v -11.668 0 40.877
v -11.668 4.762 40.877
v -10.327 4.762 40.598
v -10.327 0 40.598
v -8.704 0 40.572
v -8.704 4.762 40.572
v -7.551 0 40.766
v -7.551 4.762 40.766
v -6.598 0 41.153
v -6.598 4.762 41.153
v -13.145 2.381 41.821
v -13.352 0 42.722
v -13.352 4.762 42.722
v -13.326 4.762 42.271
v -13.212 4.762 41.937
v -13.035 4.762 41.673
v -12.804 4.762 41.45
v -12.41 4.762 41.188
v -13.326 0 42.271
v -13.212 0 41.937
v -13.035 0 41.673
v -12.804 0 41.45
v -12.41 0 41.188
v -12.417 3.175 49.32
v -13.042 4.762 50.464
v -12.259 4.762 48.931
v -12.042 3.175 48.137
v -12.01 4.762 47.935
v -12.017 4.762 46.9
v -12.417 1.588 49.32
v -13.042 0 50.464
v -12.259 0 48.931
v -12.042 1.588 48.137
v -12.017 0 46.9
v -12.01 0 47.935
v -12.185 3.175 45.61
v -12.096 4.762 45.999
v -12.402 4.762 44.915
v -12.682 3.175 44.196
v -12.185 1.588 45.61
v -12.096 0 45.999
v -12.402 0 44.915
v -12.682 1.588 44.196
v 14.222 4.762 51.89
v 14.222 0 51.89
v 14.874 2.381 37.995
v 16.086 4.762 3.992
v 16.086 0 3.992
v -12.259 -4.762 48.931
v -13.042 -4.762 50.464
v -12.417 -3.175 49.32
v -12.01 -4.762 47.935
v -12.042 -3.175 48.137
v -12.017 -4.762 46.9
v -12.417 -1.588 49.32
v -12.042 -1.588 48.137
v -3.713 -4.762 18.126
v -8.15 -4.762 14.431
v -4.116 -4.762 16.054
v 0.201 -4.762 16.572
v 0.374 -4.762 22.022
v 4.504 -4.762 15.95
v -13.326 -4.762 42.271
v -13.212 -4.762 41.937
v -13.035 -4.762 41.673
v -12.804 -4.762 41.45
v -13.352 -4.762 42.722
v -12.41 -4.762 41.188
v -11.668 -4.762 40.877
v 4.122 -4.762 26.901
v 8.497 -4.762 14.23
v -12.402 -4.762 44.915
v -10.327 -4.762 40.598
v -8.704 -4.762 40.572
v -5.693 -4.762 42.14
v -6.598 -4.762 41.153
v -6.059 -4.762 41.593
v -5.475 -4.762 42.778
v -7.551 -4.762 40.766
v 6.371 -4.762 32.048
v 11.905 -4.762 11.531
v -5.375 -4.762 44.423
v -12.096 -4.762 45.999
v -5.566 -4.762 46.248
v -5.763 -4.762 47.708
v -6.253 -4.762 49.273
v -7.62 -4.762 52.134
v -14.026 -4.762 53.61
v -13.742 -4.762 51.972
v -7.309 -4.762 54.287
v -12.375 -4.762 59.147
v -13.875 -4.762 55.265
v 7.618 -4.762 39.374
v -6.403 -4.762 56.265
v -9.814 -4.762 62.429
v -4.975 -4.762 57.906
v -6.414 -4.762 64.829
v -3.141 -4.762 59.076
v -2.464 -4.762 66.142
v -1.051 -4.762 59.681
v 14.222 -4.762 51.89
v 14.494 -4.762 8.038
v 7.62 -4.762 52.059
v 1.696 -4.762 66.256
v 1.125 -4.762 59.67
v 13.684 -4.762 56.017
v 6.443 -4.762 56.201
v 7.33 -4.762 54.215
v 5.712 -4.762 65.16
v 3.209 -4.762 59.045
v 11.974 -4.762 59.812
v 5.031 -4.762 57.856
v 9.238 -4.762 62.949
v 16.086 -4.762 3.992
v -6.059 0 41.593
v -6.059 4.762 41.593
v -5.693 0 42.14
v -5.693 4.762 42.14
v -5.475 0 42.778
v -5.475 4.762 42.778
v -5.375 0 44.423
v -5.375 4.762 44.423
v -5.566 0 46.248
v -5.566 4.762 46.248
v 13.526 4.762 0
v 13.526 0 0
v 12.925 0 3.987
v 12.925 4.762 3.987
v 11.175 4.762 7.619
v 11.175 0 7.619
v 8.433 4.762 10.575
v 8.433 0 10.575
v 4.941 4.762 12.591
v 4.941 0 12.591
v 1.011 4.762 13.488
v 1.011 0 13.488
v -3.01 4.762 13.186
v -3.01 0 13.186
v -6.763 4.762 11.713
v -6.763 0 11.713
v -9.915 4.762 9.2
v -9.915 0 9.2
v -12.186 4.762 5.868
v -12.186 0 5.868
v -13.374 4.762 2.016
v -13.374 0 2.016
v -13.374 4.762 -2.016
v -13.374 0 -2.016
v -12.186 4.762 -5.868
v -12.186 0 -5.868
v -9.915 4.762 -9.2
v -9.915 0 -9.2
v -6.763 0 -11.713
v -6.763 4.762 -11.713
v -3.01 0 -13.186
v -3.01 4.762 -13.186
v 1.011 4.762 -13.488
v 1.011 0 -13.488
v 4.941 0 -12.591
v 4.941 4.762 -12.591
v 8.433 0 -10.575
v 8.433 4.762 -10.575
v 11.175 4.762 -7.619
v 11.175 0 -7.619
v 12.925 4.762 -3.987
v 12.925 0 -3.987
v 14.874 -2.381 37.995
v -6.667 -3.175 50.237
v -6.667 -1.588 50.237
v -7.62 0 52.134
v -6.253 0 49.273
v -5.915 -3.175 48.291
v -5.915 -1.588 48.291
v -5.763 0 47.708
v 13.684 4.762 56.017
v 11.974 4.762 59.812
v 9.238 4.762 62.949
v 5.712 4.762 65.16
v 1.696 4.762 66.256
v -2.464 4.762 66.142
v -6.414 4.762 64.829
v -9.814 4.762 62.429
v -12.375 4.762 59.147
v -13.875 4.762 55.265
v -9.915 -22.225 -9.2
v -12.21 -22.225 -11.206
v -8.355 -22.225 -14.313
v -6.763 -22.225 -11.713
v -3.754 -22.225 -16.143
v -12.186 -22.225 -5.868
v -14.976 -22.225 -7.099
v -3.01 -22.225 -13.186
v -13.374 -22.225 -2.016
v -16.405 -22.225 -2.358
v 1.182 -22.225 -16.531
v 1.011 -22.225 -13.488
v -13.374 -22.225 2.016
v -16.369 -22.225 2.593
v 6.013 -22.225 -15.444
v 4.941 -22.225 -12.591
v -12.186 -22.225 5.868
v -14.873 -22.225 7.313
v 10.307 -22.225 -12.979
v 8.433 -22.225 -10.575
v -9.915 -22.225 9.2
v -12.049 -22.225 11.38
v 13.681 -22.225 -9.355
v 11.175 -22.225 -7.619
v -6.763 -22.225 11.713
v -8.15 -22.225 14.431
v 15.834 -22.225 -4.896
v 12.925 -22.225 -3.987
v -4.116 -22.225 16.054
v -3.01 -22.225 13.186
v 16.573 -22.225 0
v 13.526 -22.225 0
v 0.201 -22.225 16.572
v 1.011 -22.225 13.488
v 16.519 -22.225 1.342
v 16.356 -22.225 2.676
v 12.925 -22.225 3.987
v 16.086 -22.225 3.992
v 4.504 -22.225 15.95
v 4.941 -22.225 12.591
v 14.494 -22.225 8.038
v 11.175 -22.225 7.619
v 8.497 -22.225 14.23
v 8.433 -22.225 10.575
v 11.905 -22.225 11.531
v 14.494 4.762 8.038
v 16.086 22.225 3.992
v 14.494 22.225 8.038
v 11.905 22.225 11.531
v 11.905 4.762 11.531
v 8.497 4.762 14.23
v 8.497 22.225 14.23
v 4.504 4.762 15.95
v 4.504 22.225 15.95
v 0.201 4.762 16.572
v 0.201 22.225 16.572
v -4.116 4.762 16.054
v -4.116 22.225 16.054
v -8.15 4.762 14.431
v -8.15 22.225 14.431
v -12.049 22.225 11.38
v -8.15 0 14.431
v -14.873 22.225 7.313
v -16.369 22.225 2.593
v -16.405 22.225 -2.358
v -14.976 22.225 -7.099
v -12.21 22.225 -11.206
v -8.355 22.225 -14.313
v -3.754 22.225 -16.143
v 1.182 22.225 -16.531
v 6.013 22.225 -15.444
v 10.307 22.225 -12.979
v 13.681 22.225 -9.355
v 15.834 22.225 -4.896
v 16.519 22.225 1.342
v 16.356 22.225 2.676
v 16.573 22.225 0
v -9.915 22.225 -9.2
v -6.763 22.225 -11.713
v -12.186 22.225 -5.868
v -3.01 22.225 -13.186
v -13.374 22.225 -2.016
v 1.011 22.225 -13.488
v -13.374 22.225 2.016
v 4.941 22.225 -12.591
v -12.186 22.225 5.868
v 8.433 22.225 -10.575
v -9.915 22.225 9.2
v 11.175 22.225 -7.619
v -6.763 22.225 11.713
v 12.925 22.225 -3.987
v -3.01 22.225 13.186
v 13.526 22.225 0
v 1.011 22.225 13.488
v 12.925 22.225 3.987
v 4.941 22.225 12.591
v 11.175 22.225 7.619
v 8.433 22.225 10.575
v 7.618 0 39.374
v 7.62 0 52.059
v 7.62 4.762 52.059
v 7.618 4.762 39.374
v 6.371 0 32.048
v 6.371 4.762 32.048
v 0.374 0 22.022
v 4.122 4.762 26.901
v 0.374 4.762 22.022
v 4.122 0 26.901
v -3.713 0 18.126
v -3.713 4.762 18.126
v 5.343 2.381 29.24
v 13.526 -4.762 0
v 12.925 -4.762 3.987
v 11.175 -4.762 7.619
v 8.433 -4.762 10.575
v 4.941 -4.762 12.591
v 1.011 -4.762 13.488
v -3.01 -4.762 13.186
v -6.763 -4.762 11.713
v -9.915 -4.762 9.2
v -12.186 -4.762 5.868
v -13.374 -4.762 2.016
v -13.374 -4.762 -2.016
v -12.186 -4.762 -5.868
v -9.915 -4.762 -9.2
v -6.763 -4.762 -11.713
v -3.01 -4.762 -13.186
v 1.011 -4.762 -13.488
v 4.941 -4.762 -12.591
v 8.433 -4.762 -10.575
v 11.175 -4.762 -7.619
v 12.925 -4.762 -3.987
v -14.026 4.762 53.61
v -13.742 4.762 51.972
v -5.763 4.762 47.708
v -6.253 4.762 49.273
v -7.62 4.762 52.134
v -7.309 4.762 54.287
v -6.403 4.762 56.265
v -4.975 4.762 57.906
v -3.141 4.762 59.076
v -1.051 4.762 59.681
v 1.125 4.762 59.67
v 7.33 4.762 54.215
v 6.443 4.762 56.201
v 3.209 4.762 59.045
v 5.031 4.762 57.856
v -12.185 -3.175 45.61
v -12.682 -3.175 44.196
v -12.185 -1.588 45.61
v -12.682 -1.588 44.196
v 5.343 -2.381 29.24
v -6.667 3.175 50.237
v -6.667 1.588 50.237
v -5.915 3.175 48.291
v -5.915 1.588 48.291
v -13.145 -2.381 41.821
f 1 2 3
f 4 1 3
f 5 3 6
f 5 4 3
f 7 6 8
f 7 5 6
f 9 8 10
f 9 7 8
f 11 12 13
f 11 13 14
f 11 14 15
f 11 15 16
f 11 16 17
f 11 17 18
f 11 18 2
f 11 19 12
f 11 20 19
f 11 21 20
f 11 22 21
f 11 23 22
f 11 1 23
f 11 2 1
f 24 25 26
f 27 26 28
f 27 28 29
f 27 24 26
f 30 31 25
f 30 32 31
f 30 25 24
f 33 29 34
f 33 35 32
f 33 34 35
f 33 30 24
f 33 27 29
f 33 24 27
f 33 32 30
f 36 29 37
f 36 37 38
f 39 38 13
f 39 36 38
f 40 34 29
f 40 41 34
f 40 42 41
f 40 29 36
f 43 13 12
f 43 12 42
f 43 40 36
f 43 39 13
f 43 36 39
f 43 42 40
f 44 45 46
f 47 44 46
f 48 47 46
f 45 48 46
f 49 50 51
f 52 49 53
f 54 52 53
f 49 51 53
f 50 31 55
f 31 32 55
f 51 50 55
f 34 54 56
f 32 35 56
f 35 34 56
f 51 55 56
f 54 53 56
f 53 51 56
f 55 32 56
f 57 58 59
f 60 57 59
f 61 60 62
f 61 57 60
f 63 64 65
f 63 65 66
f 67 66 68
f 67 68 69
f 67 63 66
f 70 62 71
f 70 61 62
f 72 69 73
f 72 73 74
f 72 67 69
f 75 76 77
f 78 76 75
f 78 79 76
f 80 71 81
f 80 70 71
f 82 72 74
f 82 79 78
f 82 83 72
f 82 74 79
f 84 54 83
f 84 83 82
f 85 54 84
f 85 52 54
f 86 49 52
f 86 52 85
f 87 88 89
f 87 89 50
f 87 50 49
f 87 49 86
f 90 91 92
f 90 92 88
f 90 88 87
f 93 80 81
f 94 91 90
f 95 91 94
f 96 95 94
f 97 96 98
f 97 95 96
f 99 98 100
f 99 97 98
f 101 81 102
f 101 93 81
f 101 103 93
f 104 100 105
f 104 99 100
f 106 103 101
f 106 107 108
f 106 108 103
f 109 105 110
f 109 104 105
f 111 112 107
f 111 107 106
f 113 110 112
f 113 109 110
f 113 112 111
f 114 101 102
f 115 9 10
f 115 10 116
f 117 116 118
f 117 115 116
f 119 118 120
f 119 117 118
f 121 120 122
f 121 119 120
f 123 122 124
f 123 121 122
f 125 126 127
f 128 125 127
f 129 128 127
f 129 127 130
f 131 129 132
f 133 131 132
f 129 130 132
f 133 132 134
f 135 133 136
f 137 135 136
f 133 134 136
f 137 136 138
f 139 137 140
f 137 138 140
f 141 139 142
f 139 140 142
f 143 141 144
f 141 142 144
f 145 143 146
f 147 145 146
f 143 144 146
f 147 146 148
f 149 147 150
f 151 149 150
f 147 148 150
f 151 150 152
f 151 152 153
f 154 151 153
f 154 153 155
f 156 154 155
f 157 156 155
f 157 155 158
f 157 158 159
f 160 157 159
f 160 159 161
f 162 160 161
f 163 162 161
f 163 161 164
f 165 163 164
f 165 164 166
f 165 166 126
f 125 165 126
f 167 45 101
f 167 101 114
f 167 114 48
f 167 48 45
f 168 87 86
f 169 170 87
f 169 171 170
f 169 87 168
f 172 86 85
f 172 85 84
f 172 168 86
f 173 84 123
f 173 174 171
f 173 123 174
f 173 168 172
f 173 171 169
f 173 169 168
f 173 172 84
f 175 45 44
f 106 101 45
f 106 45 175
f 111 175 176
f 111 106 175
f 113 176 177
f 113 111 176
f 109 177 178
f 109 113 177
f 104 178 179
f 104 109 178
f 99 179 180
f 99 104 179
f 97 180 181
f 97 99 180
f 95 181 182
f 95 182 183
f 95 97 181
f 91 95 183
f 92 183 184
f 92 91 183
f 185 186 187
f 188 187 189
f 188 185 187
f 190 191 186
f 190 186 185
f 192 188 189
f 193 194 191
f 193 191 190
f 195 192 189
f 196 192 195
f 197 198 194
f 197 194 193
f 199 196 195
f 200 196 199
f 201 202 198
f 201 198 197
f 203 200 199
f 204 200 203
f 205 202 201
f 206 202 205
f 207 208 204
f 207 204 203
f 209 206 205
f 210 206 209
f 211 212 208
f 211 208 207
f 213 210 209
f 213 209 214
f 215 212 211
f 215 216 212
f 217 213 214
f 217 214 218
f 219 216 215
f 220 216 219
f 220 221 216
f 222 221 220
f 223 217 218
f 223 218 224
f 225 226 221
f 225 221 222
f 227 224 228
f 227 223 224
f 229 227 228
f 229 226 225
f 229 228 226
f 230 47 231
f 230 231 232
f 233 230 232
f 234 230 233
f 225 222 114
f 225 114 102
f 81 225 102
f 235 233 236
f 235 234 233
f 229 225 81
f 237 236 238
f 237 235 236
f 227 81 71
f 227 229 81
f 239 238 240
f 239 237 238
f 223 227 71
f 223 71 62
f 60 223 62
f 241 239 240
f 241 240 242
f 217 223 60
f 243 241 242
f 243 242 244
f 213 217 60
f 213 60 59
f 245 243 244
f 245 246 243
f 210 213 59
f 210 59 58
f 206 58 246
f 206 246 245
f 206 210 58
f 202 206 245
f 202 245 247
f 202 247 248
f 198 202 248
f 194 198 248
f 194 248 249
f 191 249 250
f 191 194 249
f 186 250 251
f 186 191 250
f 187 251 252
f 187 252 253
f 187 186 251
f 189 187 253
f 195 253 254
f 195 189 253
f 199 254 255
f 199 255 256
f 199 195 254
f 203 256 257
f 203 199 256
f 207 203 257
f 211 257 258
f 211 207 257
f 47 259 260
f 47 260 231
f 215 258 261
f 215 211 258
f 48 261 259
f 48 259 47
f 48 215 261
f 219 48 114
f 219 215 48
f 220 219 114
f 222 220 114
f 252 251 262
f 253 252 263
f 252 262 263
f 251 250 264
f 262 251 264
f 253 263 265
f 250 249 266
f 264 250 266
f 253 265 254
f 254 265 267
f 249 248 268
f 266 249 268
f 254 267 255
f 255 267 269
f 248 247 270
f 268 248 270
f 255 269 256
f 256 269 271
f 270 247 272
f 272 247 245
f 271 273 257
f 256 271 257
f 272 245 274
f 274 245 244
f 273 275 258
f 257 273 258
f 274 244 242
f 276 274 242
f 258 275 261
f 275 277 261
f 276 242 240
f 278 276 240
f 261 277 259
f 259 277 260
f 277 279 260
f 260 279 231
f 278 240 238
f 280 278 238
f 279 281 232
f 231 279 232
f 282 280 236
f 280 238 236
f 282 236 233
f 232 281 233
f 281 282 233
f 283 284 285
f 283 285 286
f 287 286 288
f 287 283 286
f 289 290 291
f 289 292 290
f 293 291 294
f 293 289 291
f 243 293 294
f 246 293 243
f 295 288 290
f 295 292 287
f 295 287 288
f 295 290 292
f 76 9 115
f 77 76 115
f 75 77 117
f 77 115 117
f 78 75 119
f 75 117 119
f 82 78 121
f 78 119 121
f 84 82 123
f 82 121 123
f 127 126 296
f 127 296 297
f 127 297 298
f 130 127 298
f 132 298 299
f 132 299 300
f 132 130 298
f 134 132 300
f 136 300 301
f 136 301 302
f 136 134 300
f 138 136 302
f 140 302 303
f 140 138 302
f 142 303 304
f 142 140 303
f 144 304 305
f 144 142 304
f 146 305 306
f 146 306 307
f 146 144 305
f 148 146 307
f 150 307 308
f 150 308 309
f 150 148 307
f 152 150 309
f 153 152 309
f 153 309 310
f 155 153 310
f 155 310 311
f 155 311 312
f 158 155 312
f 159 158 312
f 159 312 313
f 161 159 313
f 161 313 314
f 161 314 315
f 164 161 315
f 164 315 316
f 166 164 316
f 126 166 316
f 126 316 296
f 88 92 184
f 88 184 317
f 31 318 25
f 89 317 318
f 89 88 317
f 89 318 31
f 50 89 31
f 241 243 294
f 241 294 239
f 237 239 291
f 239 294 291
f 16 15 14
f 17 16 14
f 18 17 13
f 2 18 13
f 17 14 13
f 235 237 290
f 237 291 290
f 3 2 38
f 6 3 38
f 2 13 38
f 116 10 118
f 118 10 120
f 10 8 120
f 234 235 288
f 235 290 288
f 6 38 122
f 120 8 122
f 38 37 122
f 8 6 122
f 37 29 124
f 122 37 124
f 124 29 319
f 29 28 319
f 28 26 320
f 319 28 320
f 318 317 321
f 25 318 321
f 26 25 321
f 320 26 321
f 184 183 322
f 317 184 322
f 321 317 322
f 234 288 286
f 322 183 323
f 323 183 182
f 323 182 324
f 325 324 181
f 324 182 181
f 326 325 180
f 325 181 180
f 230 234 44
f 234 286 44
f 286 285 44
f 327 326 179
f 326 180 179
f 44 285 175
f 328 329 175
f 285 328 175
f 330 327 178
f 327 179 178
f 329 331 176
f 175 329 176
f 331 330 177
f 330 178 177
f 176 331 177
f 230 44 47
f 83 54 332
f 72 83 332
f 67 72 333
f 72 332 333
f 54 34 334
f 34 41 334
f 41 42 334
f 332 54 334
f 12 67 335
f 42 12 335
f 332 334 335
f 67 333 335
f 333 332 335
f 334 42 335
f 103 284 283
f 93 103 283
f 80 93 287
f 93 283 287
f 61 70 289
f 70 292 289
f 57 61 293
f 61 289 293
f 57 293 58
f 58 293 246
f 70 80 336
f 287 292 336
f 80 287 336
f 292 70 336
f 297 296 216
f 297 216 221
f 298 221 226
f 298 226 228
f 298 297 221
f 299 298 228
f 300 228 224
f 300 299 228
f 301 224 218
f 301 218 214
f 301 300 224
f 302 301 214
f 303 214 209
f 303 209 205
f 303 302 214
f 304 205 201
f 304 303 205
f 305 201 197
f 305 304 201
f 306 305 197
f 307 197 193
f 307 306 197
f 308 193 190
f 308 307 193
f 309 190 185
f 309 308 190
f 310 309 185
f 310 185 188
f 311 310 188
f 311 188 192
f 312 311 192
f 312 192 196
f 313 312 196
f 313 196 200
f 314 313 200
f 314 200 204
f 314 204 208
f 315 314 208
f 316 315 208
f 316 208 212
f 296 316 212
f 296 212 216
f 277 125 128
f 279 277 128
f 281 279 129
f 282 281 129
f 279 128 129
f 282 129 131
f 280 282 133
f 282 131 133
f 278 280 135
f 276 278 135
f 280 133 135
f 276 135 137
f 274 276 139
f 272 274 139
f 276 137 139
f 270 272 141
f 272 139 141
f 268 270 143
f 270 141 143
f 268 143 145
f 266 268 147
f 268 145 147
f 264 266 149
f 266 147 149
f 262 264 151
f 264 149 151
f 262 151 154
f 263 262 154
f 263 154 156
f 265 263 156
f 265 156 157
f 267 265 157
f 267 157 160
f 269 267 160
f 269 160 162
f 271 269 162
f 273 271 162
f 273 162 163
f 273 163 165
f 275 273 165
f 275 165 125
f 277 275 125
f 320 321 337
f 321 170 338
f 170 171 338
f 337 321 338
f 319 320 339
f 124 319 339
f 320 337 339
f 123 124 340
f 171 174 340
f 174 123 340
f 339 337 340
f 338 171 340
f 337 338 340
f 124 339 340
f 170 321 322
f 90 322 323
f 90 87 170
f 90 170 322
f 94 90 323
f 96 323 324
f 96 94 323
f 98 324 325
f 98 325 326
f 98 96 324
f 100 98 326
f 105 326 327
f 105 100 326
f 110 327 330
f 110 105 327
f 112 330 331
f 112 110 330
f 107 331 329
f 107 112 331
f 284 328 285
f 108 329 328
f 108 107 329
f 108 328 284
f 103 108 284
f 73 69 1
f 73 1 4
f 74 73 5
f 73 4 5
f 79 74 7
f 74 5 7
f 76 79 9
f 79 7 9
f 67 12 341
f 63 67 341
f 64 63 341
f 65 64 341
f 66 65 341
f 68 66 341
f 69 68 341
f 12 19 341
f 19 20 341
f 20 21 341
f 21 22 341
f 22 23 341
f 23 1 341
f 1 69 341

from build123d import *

# Parameters (mm, degrees)
F0_R     = 13.5255
F1_DEPTH = 22.225
F2_DEPTH = 4.7625


with BuildPart() as f1:
    # F0 (on Front) → F1 (new body, symmetric)
    with BuildSketch(Plane.XZ):
        with BuildLine():
            ThreePointArc((16.0855769131, 3.991881464), (6.5567714231, 15.2213550893), (-8.1495274532, 14.4314276681))
            ThreePointArc((-8.1495274532, 14.4314276681), (-8.3550795629, -14.3134044779), (16.5735, 0))
            ThreePointArc((16.5735, 0), (16.4510670052, 2.0107950269), (16.0855769131, 3.991881464))
        make_face()
        Circle(F0_R, mode=Mode.SUBTRACT)
    extrude(amount=F1_DEPTH, both=True)

    # F0 (on Front) → F2 (join, symmetric)
    with BuildSketch(Plane.XZ):
        with BuildLine():
            ThreePointArc((16.0855769131, 3.991881464), (6.5567714231, 15.2213550893), (-8.1495274532, 14.4314276681))
            ThreePointArc((-8.1495274532, 14.4314276681), (-8.3550795629, -14.3134044779), (16.5735, 0))
            ThreePointArc((16.5735, 0), (16.4510670052, 2.0107950269), (16.0855769131, 3.991881464))
        make_face()
        Circle(F0_R, mode=Mode.SUBTRACT)
        with BuildLine():
            add(Edge.make_bspline(
                [(7.6196315943, 52.0585709196), (7.9073561804, 43.8512833929), (8.4668828165, 27.9749976478), (-2.735262235, 18.8402392219), (-8.1495274532, 14.4314276681)],
                knots=[0, 0, 0, 0, 0.5168803488, 1, 1, 1, 1], degree=3))
            ThreePointArc((-8.1495274532, 14.4314276681), (6.5567714231, 15.2213550893), (16.0855769131, 3.991881464))
            add(Edge.make_bspline(
                [(14.2219077444, 51.8895407599), (14.4256822763, 47.7682077132), (14.9759634895, 37.2014626867), (15.653478831, 16.5725180559), (16.0855769131, 3.991881464)],
                knots=[0, 0, 0, 0, 0.3900119934, 1, 1, 1, 1], degree=3))
            ThreePointArc((14.2219077444, 51.8895407599), (1.6964946006, 66.2559672798), (-13.8750644733, 55.2647556367))
            ThreePointArc((-13.8750644733, 55.2647556367), (-13.937377269, 52.7814096229), (-13.0421995878, 50.4641812725))
            add(Edge.make_bspline(
                [(-13.0421995878, 50.4641812725), (-12.3253096001, 49.3346329312), (-11.8330637514, 48.1700341933), (-12.0167843997, 46.8999668956)],
                knots=[0.0832842621, 0.0832842621, 0.0832842621, 0.0832842621, 0.2506068983, 0.2506068983, 0.2506068983, 0.2506068983], degree=3))
            add(Edge.make_bspline(
                [(-12.0167843975, 46.8999668404), (-11.9685081536, 45.6929371066), (-12.6474764459, 44.2057904092), (-13.352232419, 42.7222704399)],
                knots=[0.6168006178, 0.6168006178, 0.6168006178, 0.6168006178, 1, 1, 1, 1], degree=3))
            add(Edge.make_bspline(
                [(-13.352232419, 42.7222704399), (-13.3723404879, 42.3903517549), (-13.0294229695, 40.5231715226), (-8.3379146473, 40.1111053623), (-6.5978615691, 41.1531167984)],
                knots=[0.4383260576, 0.4383260576, 0.4383260576, 0.4383260576, 0.4904587097, 0.7585657185, 0.7585657185, 0.7585657185, 0.7585657185], degree=3))
            add(Edge.make_bspline(
                [(-5.5660903454, 46.2477467954), (-5.5050556705, 44.6482001002), (-5.9652585792, 42.9216600644), (-6.5978615691, 41.1531167984)],
                knots=[0.4687776215, 0.4687776215, 0.4687776215, 0.4687776215, 0.8242974336, 0.8242974336, 0.8242974336, 0.8242974336], degree=3))
            add(Edge.make_bspline(
                [(-7.62, 52.1335), (-6.6332844065, 50.2451802325), (-5.6465688131, 48.356860465), (-5.5660903454, 46.2477467954)],
                knots=[0, 0, 0, 0, 0.4687776215, 0.4687776215, 0.4687776215, 0.4687776215], degree=3))
            ThreePointArc((-7.62, 52.1335), (0.037464993, 59.753407898), (7.6196315943, 52.0585709196))
        make_face()
        with BuildLine():
            add(Edge.make_bspline(
                [(-6.5978615691, 41.1531167984), (-6.5808454576, 41.1633067076), (-5.0331676538, 42.1138674091), (-5.3010837075, 44.1920912662), (-5.5660903454, 46.2477467954)],
                knots=[0.7585657185, 0.7585657185, 0.7585657185, 0.7585657185, 0.7611875574, 1, 1, 1, 1], degree=3))
            add(Edge.make_bspline(
                [(-5.5660903454, 46.2477467954), (-5.5050556705, 44.6482001002), (-5.9652585792, 42.9216600644), (-6.5978615691, 41.1531167984)],
                knots=[0.4687776215, 0.4687776215, 0.4687776215, 0.4687776215, 0.8242974336, 0.8242974336, 0.8242974336, 0.8242974336], degree=3))
        make_face()
    extrude(amount=F2_DEPTH, both=True)


solid = f1.part
